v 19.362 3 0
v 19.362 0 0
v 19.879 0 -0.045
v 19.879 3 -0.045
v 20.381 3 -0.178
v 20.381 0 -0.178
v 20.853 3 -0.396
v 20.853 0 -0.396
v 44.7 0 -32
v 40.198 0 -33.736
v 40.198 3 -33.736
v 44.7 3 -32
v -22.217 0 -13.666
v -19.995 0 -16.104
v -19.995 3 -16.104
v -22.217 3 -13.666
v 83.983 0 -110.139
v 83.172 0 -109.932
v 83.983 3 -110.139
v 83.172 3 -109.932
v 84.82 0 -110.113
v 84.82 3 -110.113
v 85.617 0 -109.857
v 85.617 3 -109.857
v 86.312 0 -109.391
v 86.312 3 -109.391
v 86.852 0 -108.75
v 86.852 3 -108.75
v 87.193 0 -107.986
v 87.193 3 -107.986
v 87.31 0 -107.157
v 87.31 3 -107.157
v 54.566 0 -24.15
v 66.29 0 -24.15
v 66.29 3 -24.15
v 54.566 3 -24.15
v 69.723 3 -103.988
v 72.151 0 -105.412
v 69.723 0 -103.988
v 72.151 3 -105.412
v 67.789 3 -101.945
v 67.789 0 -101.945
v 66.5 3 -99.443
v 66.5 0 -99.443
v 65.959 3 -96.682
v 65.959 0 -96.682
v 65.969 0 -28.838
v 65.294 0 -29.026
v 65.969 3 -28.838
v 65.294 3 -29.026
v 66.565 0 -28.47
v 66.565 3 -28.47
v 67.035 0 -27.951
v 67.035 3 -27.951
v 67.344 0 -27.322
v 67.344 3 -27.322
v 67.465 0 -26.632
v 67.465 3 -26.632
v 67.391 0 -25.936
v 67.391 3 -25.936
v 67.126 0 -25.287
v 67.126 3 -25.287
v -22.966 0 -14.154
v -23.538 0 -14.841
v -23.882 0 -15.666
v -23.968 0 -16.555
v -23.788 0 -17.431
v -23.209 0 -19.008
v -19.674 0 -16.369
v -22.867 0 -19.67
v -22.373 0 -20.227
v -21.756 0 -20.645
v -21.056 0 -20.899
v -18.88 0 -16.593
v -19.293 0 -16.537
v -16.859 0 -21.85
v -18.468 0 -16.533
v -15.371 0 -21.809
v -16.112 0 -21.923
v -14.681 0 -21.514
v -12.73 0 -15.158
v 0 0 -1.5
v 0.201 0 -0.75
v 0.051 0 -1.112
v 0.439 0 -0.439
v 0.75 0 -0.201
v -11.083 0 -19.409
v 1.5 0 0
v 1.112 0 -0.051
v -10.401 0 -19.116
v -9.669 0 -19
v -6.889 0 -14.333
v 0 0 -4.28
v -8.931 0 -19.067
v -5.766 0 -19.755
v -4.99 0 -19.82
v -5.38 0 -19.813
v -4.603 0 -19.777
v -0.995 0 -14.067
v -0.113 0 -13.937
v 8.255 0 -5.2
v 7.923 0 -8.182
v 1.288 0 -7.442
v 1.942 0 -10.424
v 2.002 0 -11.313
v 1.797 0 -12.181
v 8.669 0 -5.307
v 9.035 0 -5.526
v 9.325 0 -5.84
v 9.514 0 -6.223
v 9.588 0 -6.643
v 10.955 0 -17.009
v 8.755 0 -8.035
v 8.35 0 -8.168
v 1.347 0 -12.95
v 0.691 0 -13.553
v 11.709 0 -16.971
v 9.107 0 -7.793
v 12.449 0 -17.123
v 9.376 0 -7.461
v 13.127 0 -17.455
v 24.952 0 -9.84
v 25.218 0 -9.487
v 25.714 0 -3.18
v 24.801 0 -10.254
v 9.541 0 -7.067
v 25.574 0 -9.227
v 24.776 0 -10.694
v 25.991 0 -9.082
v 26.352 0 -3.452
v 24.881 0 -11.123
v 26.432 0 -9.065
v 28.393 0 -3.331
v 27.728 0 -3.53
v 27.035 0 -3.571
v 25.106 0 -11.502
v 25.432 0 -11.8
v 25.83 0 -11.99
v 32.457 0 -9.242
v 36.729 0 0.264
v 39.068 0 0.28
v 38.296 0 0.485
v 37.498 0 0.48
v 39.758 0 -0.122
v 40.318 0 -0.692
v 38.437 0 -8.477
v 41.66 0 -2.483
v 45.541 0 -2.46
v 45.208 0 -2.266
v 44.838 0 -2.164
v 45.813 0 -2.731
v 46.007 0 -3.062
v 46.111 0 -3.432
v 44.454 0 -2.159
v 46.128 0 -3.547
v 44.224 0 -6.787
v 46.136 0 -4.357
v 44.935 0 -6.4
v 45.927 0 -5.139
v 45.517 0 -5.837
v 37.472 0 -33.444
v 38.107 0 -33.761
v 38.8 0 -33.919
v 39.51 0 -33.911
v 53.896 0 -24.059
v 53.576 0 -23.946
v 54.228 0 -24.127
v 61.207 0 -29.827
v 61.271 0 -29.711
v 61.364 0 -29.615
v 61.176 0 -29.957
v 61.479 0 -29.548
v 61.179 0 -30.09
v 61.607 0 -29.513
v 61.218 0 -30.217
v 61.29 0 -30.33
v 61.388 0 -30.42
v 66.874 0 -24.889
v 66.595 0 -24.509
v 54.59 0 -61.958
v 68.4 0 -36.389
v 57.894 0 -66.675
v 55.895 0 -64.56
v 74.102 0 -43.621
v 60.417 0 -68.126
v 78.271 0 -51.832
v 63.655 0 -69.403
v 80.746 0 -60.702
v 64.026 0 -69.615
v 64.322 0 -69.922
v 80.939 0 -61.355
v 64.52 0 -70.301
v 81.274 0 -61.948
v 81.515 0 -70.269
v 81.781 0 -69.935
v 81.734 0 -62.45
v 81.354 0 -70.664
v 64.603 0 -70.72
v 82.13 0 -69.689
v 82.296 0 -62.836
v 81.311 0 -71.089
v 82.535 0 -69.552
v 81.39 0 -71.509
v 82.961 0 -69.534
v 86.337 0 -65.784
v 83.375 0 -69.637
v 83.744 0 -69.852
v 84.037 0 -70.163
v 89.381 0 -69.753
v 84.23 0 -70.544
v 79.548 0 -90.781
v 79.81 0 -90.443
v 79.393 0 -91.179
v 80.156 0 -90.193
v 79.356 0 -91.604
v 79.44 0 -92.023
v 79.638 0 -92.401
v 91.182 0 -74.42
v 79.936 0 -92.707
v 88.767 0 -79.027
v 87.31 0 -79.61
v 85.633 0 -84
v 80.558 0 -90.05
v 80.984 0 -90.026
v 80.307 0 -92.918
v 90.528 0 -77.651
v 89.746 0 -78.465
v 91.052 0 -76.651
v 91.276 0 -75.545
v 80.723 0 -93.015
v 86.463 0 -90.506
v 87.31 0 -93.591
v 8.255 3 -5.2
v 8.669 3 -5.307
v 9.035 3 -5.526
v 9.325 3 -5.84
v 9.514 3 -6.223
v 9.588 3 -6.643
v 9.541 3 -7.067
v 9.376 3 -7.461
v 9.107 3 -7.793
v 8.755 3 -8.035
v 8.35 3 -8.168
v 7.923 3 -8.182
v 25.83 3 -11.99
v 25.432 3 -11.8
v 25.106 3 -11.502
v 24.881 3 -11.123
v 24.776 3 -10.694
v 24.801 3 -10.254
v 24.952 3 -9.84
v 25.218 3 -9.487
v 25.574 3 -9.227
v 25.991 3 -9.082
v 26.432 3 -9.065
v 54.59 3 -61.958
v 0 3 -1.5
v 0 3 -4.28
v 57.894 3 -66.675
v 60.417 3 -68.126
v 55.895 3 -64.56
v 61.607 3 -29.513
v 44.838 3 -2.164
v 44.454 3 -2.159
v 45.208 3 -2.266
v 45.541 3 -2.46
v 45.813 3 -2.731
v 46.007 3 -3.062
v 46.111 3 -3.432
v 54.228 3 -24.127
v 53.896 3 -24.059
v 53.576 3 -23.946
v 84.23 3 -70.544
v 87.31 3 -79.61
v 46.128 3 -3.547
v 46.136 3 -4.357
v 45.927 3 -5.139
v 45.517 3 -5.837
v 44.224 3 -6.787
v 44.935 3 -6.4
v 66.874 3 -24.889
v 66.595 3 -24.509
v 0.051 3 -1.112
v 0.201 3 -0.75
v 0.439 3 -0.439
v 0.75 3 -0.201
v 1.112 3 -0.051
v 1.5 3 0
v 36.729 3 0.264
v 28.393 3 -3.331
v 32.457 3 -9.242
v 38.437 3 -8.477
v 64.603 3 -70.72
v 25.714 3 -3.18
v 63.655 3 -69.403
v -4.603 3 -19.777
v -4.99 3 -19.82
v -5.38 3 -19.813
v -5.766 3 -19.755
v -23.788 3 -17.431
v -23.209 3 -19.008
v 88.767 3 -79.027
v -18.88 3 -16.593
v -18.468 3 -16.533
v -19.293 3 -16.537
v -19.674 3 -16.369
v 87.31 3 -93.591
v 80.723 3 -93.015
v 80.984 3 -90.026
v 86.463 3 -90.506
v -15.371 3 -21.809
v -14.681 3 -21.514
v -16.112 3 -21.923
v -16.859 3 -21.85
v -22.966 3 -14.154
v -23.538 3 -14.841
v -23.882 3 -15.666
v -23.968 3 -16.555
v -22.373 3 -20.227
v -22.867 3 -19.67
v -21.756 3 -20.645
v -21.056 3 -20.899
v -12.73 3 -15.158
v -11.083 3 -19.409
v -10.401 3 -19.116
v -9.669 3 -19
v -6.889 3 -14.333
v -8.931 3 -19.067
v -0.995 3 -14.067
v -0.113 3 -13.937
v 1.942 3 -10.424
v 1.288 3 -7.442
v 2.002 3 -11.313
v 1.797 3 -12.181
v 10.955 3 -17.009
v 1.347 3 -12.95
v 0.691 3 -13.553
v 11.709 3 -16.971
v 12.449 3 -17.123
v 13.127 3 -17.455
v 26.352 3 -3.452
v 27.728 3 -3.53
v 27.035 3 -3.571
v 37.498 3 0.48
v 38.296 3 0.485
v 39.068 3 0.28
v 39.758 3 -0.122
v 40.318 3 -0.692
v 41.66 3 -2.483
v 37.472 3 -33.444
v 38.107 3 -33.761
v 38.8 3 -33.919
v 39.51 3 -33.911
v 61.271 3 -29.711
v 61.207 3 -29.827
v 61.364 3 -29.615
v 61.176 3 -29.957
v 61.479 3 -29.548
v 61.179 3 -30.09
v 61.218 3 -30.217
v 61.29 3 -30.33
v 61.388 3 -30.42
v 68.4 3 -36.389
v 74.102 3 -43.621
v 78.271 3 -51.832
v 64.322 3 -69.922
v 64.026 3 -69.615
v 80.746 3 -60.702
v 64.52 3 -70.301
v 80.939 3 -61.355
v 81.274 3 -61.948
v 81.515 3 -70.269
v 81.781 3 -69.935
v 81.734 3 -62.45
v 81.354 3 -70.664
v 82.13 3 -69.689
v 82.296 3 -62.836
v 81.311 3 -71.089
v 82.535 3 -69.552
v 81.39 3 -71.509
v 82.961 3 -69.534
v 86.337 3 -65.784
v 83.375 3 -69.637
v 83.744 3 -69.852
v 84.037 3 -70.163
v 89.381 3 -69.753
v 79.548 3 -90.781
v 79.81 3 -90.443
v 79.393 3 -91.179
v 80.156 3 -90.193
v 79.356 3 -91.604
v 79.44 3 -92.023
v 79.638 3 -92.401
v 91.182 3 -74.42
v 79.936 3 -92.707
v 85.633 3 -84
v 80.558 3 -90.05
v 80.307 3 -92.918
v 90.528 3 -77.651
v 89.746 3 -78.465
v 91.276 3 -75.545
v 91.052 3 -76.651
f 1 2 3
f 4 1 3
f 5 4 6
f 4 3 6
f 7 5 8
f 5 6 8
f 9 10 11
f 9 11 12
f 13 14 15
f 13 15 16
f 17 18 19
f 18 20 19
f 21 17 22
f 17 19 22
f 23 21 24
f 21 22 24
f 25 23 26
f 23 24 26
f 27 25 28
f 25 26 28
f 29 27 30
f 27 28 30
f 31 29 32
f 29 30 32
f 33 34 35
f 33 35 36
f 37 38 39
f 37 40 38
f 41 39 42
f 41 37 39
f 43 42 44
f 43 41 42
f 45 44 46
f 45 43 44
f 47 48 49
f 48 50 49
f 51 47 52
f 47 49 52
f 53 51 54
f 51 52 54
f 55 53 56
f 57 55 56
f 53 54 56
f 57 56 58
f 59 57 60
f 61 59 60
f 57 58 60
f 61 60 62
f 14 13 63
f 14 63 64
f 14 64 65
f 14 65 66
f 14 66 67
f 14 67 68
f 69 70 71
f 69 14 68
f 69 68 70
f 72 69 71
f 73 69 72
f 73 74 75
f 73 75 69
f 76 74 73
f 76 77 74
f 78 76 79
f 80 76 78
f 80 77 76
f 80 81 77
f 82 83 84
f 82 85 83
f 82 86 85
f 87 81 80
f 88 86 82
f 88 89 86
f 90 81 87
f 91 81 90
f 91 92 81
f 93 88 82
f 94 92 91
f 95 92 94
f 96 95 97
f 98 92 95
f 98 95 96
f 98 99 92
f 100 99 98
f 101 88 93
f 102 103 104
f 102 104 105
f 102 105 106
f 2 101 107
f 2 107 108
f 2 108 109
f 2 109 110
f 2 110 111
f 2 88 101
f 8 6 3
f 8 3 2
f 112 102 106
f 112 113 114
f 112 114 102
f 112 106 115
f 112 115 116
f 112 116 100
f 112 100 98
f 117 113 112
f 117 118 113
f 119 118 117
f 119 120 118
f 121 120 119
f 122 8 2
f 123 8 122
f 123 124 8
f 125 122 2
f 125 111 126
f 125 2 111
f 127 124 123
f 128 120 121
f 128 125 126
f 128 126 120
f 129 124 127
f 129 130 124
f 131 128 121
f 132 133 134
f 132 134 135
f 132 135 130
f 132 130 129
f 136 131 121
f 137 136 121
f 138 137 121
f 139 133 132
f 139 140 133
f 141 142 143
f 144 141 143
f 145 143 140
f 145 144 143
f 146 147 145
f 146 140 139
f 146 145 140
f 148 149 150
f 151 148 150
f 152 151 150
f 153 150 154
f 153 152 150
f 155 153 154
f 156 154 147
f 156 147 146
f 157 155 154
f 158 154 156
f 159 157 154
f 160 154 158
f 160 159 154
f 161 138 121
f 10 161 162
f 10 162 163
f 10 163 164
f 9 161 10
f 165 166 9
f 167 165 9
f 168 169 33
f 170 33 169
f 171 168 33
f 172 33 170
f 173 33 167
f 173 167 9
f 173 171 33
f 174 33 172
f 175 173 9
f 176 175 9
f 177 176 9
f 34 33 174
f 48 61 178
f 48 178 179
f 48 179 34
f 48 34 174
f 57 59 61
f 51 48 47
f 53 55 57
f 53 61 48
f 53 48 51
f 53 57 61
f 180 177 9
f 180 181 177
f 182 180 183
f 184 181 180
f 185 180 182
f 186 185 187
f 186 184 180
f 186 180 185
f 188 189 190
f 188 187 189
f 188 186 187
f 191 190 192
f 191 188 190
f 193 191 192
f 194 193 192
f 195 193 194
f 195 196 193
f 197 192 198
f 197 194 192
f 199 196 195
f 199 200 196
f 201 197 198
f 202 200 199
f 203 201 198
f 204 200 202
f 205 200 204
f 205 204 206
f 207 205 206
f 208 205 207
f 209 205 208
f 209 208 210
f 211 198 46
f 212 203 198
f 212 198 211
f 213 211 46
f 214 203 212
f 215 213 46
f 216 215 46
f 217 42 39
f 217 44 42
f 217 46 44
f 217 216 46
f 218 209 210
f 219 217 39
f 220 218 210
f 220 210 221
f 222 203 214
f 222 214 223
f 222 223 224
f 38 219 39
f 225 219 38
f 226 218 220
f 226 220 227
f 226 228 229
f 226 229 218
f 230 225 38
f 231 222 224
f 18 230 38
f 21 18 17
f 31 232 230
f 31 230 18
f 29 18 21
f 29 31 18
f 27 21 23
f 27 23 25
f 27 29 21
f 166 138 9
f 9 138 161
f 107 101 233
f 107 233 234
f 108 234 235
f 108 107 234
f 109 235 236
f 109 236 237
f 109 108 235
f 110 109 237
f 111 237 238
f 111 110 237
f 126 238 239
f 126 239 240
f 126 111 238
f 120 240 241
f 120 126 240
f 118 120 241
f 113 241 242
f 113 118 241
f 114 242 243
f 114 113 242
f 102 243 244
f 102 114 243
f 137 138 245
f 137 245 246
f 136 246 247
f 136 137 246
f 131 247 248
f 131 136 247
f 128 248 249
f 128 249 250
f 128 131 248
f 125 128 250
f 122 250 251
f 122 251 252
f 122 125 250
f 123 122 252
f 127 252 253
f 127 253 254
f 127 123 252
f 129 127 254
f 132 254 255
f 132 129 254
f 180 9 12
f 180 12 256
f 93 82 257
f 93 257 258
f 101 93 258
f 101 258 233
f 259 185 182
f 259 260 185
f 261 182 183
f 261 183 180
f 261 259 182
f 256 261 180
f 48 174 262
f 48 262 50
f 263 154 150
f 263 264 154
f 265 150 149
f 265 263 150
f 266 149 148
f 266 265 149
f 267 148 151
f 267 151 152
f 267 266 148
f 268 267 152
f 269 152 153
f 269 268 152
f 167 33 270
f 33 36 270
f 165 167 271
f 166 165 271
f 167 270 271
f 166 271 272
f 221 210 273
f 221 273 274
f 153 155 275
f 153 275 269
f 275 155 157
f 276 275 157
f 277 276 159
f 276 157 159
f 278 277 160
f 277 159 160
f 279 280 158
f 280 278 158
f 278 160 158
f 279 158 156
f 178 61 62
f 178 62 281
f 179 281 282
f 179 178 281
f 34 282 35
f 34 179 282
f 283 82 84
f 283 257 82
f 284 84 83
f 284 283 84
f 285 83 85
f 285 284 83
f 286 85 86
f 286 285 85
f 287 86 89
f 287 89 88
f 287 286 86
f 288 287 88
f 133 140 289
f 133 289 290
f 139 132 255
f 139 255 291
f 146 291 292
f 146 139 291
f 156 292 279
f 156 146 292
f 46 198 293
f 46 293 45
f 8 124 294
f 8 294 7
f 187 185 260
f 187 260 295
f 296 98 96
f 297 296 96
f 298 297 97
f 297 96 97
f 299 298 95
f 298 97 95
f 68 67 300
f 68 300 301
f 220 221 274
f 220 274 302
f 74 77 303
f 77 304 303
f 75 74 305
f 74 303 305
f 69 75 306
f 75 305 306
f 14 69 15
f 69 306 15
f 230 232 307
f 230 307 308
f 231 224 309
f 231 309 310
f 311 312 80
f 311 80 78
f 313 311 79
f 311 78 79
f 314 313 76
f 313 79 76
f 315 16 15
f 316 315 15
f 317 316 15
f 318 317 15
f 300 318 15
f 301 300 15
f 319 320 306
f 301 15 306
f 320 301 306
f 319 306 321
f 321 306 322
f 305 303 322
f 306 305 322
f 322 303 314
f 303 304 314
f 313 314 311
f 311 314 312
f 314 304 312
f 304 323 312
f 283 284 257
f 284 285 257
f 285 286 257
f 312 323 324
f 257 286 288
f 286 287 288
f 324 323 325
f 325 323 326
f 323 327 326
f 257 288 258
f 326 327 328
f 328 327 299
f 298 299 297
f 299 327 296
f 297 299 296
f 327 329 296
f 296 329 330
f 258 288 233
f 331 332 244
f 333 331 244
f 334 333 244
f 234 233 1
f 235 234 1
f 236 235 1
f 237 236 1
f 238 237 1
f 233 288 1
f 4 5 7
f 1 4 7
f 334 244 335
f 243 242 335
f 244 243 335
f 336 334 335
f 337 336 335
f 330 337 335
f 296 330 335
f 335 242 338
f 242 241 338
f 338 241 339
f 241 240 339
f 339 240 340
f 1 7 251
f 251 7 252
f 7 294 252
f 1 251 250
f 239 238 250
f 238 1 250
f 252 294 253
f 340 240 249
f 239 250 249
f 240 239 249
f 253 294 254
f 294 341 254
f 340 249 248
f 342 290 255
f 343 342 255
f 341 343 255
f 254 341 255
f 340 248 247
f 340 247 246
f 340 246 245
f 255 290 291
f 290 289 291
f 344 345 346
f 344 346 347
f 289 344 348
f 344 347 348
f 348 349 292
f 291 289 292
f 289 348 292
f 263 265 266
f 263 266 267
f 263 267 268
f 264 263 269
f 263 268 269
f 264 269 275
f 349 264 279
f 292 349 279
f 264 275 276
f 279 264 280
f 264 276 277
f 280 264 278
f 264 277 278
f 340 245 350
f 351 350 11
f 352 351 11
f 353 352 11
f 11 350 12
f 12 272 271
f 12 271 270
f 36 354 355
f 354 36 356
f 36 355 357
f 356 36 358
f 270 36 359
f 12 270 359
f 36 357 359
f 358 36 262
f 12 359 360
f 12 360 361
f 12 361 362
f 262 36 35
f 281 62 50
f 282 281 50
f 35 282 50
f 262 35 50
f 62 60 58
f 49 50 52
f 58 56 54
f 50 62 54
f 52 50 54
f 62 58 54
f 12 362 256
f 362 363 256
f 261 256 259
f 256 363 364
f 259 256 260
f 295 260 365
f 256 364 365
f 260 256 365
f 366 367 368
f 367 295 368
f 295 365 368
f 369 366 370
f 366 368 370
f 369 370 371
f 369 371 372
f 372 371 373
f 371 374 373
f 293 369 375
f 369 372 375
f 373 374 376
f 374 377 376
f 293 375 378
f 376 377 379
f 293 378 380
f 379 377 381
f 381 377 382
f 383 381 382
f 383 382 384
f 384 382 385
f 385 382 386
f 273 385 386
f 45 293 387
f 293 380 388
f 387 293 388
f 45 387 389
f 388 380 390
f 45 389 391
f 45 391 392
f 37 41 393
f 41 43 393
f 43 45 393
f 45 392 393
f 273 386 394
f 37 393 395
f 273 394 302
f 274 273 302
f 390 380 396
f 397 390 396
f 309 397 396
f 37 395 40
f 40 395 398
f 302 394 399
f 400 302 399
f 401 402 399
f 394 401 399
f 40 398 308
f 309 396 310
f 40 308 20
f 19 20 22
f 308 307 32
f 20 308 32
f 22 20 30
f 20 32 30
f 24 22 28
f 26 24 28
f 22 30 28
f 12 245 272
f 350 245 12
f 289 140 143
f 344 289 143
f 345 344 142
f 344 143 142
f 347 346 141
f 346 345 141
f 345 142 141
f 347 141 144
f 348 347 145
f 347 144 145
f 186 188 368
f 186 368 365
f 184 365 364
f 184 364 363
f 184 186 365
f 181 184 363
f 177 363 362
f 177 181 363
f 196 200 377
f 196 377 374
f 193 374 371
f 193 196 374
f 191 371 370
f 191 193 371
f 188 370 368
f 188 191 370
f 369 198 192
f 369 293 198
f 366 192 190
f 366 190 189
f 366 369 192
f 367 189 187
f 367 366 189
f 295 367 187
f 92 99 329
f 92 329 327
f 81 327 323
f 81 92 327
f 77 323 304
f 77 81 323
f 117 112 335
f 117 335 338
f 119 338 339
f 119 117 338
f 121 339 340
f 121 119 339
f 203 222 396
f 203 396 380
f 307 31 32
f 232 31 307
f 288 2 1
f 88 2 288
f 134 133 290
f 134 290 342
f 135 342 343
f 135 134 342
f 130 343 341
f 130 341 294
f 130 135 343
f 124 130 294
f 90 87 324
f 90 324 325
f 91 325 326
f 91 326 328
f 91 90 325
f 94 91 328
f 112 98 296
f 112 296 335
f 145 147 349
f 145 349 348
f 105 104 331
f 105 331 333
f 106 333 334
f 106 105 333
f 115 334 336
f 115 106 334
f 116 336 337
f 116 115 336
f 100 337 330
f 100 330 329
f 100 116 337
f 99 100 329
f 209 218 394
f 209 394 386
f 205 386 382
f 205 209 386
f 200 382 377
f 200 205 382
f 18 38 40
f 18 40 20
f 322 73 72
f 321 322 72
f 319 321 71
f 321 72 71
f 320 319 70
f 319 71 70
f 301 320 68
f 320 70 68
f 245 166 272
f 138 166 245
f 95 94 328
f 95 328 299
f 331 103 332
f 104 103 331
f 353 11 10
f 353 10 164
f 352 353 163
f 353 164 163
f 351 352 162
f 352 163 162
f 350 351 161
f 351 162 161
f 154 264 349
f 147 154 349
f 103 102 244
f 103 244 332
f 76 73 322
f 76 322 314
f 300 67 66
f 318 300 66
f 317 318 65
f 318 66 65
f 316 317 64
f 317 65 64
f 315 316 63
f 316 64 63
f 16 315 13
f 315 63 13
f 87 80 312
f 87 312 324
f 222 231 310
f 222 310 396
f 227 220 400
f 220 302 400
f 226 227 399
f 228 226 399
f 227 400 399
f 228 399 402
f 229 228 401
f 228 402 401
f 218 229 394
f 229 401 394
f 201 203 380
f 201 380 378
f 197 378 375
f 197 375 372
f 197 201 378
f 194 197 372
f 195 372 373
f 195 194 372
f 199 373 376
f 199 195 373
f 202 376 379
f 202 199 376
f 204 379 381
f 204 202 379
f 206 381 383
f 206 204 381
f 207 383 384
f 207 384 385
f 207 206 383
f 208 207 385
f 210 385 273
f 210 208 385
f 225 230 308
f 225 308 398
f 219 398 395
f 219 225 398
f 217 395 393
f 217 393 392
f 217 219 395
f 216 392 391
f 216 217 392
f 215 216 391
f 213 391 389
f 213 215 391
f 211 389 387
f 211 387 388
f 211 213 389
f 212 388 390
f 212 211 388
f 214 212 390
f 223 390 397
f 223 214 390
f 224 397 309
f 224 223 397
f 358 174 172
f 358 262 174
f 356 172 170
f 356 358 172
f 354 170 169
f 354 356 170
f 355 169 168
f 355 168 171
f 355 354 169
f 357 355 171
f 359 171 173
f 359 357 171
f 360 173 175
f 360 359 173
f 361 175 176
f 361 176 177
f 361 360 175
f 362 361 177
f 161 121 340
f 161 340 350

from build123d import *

# Parameters (mm, degrees)
BOSS_EXTRUDE1_DEPTH = 3
FILLET1_R           = 3
FILLET2_R           = 1.5
FILLET3_R           = 10
FILLET4_R           = 3
FILLET5_R           = 4
FILLET6_R           = 2.5
FILLET7_R           = 0.5


with BuildPart() as part:
    # Sketch3 → Boss-Extrude1 (new body)
    with BuildSketch(Plane(origin=(0, 0, 0), x_dir=(1, 0, 0), z_dir=(0, 1, 0))):
        with BuildLine():
            Line((7.923093171, 8.181542538), (1.28839884, 7.442154357))
            Line((1.28839884, 7.442154357), (2.76822933, 14.19))
            ThreePointArc((2.76822933, 14.19), (-8.413807268, 14.494015924), (-19.359710867, 16.8))
            Line((-19.359710867, 16.8), (-22.216794933, 13.666296862))
            Line((-22.216794933, 13.666296862), (-24.820279869, 14.62298821))
            Line((-24.820279869, 14.62298821), (-22.646481841, 20.53863742))
            Line((-22.646481841, 20.53863742), (-15.703804617, 22.111794774))
            Line((-15.703804617, 22.111794774), (-10.073302156, 18.818482014))
            Line((-10.073302156, 18.818482014), (-5.186450964, 19.880840969))
            Line((-5.186450964, 19.880840969), (12.13, 16.8))
            Line((12.13, 16.8), (38.76, 34.29))
            Line((38.76, 34.29), (44.7, 32))
            Line((44.7, 32), (56.058554748, 66.4069852))
            Line((56.058554748, 66.4069852), (64.552315124, 69.756868371))
            Line((64.552315124, 69.756868371), (66.29, 103.00790875))
            Line((66.29, 103.00790875), (87.31, 111.63))
            Line((87.31, 111.63), (87.31, 93.591357519))
            Line((87.31, 93.591357519), (80.722672152, 93.01504101))
            ThreePointArc((80.722672152, 93.01504101), (79.359113719, 91.390015348), (80.984139381, 90.026456915))
            Line((80.984139381, 90.026456915), (86.46321022, 90.505813501))
            Line((86.46321022, 90.505813501), (85.632866314, 84))
            Line((85.632866314, 84), (81.389705108, 71.508585308))
            ThreePointArc((81.389705108, 71.508585308), (82.327545423, 69.605835839), (84.230294892, 70.543676154))
            Line((84.230294892, 70.543676154), (87.31, 79.61))
            Line((87.31, 79.61), (91.618486592, 77.887634392))
            ThreePointArc((91.618486592, 77.887634392), (88.600013238, 68.48894743), (80.984139381, 62.208424889))
            ThreePointArc((80.984139381, 62.208424889), (74.158506271, 43.709858628), (60.297831214, 29.686025056))
            Line((60.297831214, 29.686025056), (68.03871852, 28.66301442))
            ThreePointArc((68.03871852, 28.66301442), (67.586257486, 26.243028794), (66.29, 24.15))
            Line((66.29, 24.15), (54.05, 24.15))
            Line((54.05, 24.15), (25.830040494, 11.99))
            ThreePointArc((25.830040494, 11.99), (24.800734775, 10.253880031), (26.431506195, 9.064692331))
            ThreePointArc((26.431506195, 9.064692331), (36.664028635, 8.803570476), (46.46571567, 5.854056721))
            Line((46.46571567, 5.854056721), (45.9, 1.991540554))
            Line((45.9, 1.991540554), (41.660045255, 2.482673431))
            Line((41.660045255, 2.482673431), (38.9, -1.2))
            Line((38.9, -1.2), (27.015518097, 3.924692331))
            Line((27.015518097, 3.924692331), (20.16, 0))
            Line((20.16, 0), (0, 0))
            Line((0, 0), (0, 4.28))
            Line((0, 4.28), (8.255364291, 5.2))
            ThreePointArc((8.255364291, 5.2), (9.58, 6.856906829), (7.923093171, 8.181542538))
        make_face()
    extrude(amount=BOSS_EXTRUDE1_DEPTH)

    # Fillet1
    # the kernel refuses this fillet: 3 mm, written as the material it adds along each edge
    with BuildSketch(Plane(origin=(80.984139381, 0, -62.208424889), x_dir=(0.9022478681487618, 0, -0.4312177923289046), z_dir=(0, 1, 0))) as fillet1_piece_1:
        with BuildLine():
            CenterArc((1.578679862, -2.997421373), FILLET1_R, 92.37575888, 52.157589609)
            ThreePointArc((-0.864680258, -1.256734347), (-0.427200708, -0.631903288), (0, 0))
            ThreePointArc((0, 0), (0.72716053, -0.015077949), (1.45432106, 0))
        make_face()
    extrude(amount=3)
    with BuildSketch(Plane(origin=(27.015518097, 0, -3.924692331), x_dir=(0.9182659150547935, 0, 0.39596427774305953), z_dir=(0, 1, 0))) as fillet1_piece_2:
        with BuildLine():
            CenterArc((FILLET1_R * 0.49985366711, -FILLET1_R), FILLET1_R, 90, 53.116686758)
            Line((-FILLET1_R * 0.300005823165, -FILLET1_R * 0.399812699386), (0, 0))
            Line((0, 0), (FILLET1_R * 0.49985366711, 0))
        make_face()
    extrude(amount=3)
    with BuildSketch(Plane(origin=(12.13, 0, -16.8), x_dir=(-0.9845393680489544, 0, -0.17516344584919966), z_dir=(0, 1, 0))) as fillet1_piece_3:
        with BuildLine():
            CenterArc((FILLET1_R * 0.397788634748, -FILLET1_R), FILLET1_R, 90, 43.384200988)
            Line((-FILLET1_R * 0.289098500769, -FILLET1_R * 0.273235895863), (0, 0))
            Line((0, 0), (FILLET1_R * 0.397788634748, 0))
        make_face()
    extrude(amount=3)
    with BuildSketch(Plane(origin=(-10.073302156, 0, -18.818482014), x_dir=(-0.863187603129405, 0, -0.5048833150379528), z_dir=(0, 1, 0))) as fillet1_piece_4:
        with BuildLine():
            CenterArc((FILLET1_R * 0.389766900576, -FILLET1_R), FILLET1_R, 90, 42.58838059)
            Line((-FILLET1_R * 0.286959776942, -FILLET1_R * 0.263765659633), (0, 0))
            Line((0, 0), (FILLET1_R * 0.389766900576, 0))
        make_face()
    extrude(amount=3)
    with BuildSketch(Plane(origin=(2.76822933, 0, -14.19), x_dir=(-0.21421340809022724, 0, 0.9767868835085624), z_dir=(0, 1, 0))) as fillet1_piece_5:
        with BuildLine():
            CenterArc((3.855271405, -3), FILLET1_R, 90, 102.505548925)
            ThreePointArc((0.926446282, -3.649602493), (0.490902504, -1.81777488), (0, 0))
            Line((0, 0), (3.855271405, 0))
        make_face()
    extrude(amount=3)
    # the kernel refuses this fillet: 3 mm, written as the material it takes off along each edge
    with BuildSketch(Plane(origin=(-24.820279869, -7.478630688, -14.62298821), x_dir=(0.9386336815677853, 0, 0.3449156590044952), z_dir=(0, 1, 0))) as fillet1_2_piece_1:
        with BuildLine():
            CenterArc((3, 2.991452275), FILLET1_R, 180, 85.673811508)
            Line((0, 2.991452275), (0, 0))
            Line((0, 0), (2.773696477, 0))
        make_face()
    extrude(amount=17.957261376, mode=Mode.SUBTRACT)
    with BuildSketch(Plane(origin=(20.16, -1.994934097, 0), x_dir=(0.8678473261649016, 0, -0.4968309757537575), z_dir=(0, 1, 0))) as fillet1_2_piece_2:
        with BuildLine():
            CenterArc((FILLET1_R * 0.265991212876, FILLET1_R), FILLET1_R, 240.209440415, 29.790559585)
            Line((-FILLET1_R * 0.230839762878, FILLET1_R * 0.132152673835), (0, 0))
            Line((0, 0), (FILLET1_R * 0.265991212876, 0))
        make_face()
    extrude(amount=6.989868193, mode=Mode.SUBTRACT)
    with BuildSketch(Plane(origin=(46.46571567, -6.070952348, -5.854056721), x_dir=(-0.9233291277987619, 0, -0.38400953342121286), z_dir=(0, 1, 0))) as fillet1_2_piece_3:
        with BuildLine():
            CenterArc((2.333722575, 2.99850626), FILLET1_R, 194.249797413, 77.558344276)
            Line((-0.573972765, 2.260056662), (0, 0))
            ThreePointArc((0, 0), (1.21419047, -0.019160317), (2.428380939, 0))
        make_face()
    extrude(amount=15.141904695, mode=Mode.SUBTRACT)
    with BuildSketch(Plane(origin=(38.9, -5.909950036, 1.2), x_dir=(0.5997274231965581, 0, -0.8002043600643629), z_dir=(0, 1, 0))) as fillet1_2_piece_4:
        with BuildLine():
            CenterArc((FILLET1_R * 0.78799333809, FILLET1_R), FILLET1_R, 193.524251091, 76.475748909)
            Line((-FILLET1_R * 0.184277686804, FILLET1_R * 0.766143090435), (0, 0))
            Line((0, 0), (FILLET1_R * 0.78799333809, 0))
        make_face()
    extrude(amount=14.819900071, mode=Mode.SUBTRACT)
    with BuildSketch(Plane(origin=(38.76, -3.852720436, -34.29), x_dir=(-0.8358453893738872, 0, 0.5489649215226915), z_dir=(0, 1, 0))) as fillet1_2_piece_5:
        with BuildLine():
            CenterArc((FILLET1_R * 0.513696058133, FILLET1_R), FILLET1_R, 215.621225969, 54.378774031)
            Line((-FILLET1_R * 0.299188992069, FILLET1_R * 0.417575846005), (0, 0))
            Line((0, 0), (FILLET1_R * 0.513696058133, 0))
        make_face()
    extrude(amount=10.705440872, mode=Mode.SUBTRACT)
    with BuildSketch(Plane(origin=(-5.186450964, -1.481839662, -19.880840969), x_dir=(-0.9771763639228005, 0, 0.2124296443310458), z_dir=(0, 1, 0))) as fillet1_2_piece_6:
        with BuildLine():
            CenterArc((FILLET1_R * 0.197578621542, FILLET1_R), FILLET1_R, 247.647056489, 22.352943511)
            Line((-FILLET1_R * 0.18273230535, FILLET1_R * 0.0751413086926), (0, 0))
            Line((0, 0), (FILLET1_R * 0.197578621542, 0))
        make_face()
    extrude(amount=5.963679323, mode=Mode.SUBTRACT)
    with BuildSketch(Plane(origin=(-15.703804617, -2.961195523, -22.111794774), x_dir=(-0.975276058531981, 0, 0.22099006686800218), z_dir=(0, 1, 0))) as fillet1_2_piece_7:
        with BuildLine():
            CenterArc((FILLET1_R * 0.394826069747, FILLET1_R), FILLET1_R, 226.909202107, 43.090797893)
            Line((-FILLET1_R * 0.288330425897, FILLET1_R * 0.269727994197), (0, 0))
            Line((0, 0), (FILLET1_R * 0.394826069747, 0))
        make_face()
    extrude(amount=8.922391046, mode=Mode.SUBTRACT)
    with BuildSketch(Plane(origin=(-22.646481841, -4.076928403, -20.53863742), x_dir=(-0.3449156590044966, 0, 0.9386336815677849), z_dir=(0, 1, 0))) as fillet1_2_piece_8:
        with BuildLine():
            CenterArc((FILLET1_R * 0.543590453695, FILLET1_R), FILLET1_R, 212.943838396, 57.056161604)
            Line((-FILLET1_R * 0.295613569123, FILLET1_R * 0.456183295506), (0, 0))
            Line((0, 0), (FILLET1_R * 0.543590453695, 0))
        make_face()
    extrude(amount=11.153856805, mode=Mode.SUBTRACT)

    # Fillet2
    fillet2_edges = [part.edges().sort_by_distance(p)[0] for p in [
        (-19.359710867, 1.5, -16.8),
        (64.552315124, 1.5, -69.756868371),
        (45.9, 1.5, -1.991540554),
        (0, 1.5, 0),
    ]]
    fillet(fillet2_edges, radius=FILLET2_R)

    # Fillet3
    fillet3_edges = [part.edges().sort_by_distance(p)[0] for p in [
        (56.058554748, 1.5, -66.4069852),
        (66.29, 1.5, -103.00790875),
    ]]
    fillet(fillet3_edges, radius=FILLET3_R)

    # Fillet4
    fillet4_edges = [part.edges().sort_by_distance(p)[0] for p in [
        (87.31, 1.5, -111.63),
    ]]
    fillet(fillet4_edges, radius=FILLET4_R)

    # Fillet5
    fillet5_edges = [part.edges().sort_by_distance(p)[0] for p in [
        (91.618486592, 1.5, -77.887634392),
    ]]
    fillet(fillet5_edges, radius=FILLET5_R)

    # Fillet6
    fillet6_edges = [part.edges().sort_by_distance(p)[0] for p in [
        (68.03871852, 1.5, -28.66301442),
        (54.05, 1.5, -24.15),
    ]]
    fillet(fillet6_edges, radius=FILLET6_R)

    # Fillet7
    fillet7_edges = [part.edges().sort_by_distance(p)[0] for p in [
        (60.297831214, 1.5, -29.686025056),
    ]]
    fillet(fillet7_edges, radius=FILLET7_R)


solid = part.part
